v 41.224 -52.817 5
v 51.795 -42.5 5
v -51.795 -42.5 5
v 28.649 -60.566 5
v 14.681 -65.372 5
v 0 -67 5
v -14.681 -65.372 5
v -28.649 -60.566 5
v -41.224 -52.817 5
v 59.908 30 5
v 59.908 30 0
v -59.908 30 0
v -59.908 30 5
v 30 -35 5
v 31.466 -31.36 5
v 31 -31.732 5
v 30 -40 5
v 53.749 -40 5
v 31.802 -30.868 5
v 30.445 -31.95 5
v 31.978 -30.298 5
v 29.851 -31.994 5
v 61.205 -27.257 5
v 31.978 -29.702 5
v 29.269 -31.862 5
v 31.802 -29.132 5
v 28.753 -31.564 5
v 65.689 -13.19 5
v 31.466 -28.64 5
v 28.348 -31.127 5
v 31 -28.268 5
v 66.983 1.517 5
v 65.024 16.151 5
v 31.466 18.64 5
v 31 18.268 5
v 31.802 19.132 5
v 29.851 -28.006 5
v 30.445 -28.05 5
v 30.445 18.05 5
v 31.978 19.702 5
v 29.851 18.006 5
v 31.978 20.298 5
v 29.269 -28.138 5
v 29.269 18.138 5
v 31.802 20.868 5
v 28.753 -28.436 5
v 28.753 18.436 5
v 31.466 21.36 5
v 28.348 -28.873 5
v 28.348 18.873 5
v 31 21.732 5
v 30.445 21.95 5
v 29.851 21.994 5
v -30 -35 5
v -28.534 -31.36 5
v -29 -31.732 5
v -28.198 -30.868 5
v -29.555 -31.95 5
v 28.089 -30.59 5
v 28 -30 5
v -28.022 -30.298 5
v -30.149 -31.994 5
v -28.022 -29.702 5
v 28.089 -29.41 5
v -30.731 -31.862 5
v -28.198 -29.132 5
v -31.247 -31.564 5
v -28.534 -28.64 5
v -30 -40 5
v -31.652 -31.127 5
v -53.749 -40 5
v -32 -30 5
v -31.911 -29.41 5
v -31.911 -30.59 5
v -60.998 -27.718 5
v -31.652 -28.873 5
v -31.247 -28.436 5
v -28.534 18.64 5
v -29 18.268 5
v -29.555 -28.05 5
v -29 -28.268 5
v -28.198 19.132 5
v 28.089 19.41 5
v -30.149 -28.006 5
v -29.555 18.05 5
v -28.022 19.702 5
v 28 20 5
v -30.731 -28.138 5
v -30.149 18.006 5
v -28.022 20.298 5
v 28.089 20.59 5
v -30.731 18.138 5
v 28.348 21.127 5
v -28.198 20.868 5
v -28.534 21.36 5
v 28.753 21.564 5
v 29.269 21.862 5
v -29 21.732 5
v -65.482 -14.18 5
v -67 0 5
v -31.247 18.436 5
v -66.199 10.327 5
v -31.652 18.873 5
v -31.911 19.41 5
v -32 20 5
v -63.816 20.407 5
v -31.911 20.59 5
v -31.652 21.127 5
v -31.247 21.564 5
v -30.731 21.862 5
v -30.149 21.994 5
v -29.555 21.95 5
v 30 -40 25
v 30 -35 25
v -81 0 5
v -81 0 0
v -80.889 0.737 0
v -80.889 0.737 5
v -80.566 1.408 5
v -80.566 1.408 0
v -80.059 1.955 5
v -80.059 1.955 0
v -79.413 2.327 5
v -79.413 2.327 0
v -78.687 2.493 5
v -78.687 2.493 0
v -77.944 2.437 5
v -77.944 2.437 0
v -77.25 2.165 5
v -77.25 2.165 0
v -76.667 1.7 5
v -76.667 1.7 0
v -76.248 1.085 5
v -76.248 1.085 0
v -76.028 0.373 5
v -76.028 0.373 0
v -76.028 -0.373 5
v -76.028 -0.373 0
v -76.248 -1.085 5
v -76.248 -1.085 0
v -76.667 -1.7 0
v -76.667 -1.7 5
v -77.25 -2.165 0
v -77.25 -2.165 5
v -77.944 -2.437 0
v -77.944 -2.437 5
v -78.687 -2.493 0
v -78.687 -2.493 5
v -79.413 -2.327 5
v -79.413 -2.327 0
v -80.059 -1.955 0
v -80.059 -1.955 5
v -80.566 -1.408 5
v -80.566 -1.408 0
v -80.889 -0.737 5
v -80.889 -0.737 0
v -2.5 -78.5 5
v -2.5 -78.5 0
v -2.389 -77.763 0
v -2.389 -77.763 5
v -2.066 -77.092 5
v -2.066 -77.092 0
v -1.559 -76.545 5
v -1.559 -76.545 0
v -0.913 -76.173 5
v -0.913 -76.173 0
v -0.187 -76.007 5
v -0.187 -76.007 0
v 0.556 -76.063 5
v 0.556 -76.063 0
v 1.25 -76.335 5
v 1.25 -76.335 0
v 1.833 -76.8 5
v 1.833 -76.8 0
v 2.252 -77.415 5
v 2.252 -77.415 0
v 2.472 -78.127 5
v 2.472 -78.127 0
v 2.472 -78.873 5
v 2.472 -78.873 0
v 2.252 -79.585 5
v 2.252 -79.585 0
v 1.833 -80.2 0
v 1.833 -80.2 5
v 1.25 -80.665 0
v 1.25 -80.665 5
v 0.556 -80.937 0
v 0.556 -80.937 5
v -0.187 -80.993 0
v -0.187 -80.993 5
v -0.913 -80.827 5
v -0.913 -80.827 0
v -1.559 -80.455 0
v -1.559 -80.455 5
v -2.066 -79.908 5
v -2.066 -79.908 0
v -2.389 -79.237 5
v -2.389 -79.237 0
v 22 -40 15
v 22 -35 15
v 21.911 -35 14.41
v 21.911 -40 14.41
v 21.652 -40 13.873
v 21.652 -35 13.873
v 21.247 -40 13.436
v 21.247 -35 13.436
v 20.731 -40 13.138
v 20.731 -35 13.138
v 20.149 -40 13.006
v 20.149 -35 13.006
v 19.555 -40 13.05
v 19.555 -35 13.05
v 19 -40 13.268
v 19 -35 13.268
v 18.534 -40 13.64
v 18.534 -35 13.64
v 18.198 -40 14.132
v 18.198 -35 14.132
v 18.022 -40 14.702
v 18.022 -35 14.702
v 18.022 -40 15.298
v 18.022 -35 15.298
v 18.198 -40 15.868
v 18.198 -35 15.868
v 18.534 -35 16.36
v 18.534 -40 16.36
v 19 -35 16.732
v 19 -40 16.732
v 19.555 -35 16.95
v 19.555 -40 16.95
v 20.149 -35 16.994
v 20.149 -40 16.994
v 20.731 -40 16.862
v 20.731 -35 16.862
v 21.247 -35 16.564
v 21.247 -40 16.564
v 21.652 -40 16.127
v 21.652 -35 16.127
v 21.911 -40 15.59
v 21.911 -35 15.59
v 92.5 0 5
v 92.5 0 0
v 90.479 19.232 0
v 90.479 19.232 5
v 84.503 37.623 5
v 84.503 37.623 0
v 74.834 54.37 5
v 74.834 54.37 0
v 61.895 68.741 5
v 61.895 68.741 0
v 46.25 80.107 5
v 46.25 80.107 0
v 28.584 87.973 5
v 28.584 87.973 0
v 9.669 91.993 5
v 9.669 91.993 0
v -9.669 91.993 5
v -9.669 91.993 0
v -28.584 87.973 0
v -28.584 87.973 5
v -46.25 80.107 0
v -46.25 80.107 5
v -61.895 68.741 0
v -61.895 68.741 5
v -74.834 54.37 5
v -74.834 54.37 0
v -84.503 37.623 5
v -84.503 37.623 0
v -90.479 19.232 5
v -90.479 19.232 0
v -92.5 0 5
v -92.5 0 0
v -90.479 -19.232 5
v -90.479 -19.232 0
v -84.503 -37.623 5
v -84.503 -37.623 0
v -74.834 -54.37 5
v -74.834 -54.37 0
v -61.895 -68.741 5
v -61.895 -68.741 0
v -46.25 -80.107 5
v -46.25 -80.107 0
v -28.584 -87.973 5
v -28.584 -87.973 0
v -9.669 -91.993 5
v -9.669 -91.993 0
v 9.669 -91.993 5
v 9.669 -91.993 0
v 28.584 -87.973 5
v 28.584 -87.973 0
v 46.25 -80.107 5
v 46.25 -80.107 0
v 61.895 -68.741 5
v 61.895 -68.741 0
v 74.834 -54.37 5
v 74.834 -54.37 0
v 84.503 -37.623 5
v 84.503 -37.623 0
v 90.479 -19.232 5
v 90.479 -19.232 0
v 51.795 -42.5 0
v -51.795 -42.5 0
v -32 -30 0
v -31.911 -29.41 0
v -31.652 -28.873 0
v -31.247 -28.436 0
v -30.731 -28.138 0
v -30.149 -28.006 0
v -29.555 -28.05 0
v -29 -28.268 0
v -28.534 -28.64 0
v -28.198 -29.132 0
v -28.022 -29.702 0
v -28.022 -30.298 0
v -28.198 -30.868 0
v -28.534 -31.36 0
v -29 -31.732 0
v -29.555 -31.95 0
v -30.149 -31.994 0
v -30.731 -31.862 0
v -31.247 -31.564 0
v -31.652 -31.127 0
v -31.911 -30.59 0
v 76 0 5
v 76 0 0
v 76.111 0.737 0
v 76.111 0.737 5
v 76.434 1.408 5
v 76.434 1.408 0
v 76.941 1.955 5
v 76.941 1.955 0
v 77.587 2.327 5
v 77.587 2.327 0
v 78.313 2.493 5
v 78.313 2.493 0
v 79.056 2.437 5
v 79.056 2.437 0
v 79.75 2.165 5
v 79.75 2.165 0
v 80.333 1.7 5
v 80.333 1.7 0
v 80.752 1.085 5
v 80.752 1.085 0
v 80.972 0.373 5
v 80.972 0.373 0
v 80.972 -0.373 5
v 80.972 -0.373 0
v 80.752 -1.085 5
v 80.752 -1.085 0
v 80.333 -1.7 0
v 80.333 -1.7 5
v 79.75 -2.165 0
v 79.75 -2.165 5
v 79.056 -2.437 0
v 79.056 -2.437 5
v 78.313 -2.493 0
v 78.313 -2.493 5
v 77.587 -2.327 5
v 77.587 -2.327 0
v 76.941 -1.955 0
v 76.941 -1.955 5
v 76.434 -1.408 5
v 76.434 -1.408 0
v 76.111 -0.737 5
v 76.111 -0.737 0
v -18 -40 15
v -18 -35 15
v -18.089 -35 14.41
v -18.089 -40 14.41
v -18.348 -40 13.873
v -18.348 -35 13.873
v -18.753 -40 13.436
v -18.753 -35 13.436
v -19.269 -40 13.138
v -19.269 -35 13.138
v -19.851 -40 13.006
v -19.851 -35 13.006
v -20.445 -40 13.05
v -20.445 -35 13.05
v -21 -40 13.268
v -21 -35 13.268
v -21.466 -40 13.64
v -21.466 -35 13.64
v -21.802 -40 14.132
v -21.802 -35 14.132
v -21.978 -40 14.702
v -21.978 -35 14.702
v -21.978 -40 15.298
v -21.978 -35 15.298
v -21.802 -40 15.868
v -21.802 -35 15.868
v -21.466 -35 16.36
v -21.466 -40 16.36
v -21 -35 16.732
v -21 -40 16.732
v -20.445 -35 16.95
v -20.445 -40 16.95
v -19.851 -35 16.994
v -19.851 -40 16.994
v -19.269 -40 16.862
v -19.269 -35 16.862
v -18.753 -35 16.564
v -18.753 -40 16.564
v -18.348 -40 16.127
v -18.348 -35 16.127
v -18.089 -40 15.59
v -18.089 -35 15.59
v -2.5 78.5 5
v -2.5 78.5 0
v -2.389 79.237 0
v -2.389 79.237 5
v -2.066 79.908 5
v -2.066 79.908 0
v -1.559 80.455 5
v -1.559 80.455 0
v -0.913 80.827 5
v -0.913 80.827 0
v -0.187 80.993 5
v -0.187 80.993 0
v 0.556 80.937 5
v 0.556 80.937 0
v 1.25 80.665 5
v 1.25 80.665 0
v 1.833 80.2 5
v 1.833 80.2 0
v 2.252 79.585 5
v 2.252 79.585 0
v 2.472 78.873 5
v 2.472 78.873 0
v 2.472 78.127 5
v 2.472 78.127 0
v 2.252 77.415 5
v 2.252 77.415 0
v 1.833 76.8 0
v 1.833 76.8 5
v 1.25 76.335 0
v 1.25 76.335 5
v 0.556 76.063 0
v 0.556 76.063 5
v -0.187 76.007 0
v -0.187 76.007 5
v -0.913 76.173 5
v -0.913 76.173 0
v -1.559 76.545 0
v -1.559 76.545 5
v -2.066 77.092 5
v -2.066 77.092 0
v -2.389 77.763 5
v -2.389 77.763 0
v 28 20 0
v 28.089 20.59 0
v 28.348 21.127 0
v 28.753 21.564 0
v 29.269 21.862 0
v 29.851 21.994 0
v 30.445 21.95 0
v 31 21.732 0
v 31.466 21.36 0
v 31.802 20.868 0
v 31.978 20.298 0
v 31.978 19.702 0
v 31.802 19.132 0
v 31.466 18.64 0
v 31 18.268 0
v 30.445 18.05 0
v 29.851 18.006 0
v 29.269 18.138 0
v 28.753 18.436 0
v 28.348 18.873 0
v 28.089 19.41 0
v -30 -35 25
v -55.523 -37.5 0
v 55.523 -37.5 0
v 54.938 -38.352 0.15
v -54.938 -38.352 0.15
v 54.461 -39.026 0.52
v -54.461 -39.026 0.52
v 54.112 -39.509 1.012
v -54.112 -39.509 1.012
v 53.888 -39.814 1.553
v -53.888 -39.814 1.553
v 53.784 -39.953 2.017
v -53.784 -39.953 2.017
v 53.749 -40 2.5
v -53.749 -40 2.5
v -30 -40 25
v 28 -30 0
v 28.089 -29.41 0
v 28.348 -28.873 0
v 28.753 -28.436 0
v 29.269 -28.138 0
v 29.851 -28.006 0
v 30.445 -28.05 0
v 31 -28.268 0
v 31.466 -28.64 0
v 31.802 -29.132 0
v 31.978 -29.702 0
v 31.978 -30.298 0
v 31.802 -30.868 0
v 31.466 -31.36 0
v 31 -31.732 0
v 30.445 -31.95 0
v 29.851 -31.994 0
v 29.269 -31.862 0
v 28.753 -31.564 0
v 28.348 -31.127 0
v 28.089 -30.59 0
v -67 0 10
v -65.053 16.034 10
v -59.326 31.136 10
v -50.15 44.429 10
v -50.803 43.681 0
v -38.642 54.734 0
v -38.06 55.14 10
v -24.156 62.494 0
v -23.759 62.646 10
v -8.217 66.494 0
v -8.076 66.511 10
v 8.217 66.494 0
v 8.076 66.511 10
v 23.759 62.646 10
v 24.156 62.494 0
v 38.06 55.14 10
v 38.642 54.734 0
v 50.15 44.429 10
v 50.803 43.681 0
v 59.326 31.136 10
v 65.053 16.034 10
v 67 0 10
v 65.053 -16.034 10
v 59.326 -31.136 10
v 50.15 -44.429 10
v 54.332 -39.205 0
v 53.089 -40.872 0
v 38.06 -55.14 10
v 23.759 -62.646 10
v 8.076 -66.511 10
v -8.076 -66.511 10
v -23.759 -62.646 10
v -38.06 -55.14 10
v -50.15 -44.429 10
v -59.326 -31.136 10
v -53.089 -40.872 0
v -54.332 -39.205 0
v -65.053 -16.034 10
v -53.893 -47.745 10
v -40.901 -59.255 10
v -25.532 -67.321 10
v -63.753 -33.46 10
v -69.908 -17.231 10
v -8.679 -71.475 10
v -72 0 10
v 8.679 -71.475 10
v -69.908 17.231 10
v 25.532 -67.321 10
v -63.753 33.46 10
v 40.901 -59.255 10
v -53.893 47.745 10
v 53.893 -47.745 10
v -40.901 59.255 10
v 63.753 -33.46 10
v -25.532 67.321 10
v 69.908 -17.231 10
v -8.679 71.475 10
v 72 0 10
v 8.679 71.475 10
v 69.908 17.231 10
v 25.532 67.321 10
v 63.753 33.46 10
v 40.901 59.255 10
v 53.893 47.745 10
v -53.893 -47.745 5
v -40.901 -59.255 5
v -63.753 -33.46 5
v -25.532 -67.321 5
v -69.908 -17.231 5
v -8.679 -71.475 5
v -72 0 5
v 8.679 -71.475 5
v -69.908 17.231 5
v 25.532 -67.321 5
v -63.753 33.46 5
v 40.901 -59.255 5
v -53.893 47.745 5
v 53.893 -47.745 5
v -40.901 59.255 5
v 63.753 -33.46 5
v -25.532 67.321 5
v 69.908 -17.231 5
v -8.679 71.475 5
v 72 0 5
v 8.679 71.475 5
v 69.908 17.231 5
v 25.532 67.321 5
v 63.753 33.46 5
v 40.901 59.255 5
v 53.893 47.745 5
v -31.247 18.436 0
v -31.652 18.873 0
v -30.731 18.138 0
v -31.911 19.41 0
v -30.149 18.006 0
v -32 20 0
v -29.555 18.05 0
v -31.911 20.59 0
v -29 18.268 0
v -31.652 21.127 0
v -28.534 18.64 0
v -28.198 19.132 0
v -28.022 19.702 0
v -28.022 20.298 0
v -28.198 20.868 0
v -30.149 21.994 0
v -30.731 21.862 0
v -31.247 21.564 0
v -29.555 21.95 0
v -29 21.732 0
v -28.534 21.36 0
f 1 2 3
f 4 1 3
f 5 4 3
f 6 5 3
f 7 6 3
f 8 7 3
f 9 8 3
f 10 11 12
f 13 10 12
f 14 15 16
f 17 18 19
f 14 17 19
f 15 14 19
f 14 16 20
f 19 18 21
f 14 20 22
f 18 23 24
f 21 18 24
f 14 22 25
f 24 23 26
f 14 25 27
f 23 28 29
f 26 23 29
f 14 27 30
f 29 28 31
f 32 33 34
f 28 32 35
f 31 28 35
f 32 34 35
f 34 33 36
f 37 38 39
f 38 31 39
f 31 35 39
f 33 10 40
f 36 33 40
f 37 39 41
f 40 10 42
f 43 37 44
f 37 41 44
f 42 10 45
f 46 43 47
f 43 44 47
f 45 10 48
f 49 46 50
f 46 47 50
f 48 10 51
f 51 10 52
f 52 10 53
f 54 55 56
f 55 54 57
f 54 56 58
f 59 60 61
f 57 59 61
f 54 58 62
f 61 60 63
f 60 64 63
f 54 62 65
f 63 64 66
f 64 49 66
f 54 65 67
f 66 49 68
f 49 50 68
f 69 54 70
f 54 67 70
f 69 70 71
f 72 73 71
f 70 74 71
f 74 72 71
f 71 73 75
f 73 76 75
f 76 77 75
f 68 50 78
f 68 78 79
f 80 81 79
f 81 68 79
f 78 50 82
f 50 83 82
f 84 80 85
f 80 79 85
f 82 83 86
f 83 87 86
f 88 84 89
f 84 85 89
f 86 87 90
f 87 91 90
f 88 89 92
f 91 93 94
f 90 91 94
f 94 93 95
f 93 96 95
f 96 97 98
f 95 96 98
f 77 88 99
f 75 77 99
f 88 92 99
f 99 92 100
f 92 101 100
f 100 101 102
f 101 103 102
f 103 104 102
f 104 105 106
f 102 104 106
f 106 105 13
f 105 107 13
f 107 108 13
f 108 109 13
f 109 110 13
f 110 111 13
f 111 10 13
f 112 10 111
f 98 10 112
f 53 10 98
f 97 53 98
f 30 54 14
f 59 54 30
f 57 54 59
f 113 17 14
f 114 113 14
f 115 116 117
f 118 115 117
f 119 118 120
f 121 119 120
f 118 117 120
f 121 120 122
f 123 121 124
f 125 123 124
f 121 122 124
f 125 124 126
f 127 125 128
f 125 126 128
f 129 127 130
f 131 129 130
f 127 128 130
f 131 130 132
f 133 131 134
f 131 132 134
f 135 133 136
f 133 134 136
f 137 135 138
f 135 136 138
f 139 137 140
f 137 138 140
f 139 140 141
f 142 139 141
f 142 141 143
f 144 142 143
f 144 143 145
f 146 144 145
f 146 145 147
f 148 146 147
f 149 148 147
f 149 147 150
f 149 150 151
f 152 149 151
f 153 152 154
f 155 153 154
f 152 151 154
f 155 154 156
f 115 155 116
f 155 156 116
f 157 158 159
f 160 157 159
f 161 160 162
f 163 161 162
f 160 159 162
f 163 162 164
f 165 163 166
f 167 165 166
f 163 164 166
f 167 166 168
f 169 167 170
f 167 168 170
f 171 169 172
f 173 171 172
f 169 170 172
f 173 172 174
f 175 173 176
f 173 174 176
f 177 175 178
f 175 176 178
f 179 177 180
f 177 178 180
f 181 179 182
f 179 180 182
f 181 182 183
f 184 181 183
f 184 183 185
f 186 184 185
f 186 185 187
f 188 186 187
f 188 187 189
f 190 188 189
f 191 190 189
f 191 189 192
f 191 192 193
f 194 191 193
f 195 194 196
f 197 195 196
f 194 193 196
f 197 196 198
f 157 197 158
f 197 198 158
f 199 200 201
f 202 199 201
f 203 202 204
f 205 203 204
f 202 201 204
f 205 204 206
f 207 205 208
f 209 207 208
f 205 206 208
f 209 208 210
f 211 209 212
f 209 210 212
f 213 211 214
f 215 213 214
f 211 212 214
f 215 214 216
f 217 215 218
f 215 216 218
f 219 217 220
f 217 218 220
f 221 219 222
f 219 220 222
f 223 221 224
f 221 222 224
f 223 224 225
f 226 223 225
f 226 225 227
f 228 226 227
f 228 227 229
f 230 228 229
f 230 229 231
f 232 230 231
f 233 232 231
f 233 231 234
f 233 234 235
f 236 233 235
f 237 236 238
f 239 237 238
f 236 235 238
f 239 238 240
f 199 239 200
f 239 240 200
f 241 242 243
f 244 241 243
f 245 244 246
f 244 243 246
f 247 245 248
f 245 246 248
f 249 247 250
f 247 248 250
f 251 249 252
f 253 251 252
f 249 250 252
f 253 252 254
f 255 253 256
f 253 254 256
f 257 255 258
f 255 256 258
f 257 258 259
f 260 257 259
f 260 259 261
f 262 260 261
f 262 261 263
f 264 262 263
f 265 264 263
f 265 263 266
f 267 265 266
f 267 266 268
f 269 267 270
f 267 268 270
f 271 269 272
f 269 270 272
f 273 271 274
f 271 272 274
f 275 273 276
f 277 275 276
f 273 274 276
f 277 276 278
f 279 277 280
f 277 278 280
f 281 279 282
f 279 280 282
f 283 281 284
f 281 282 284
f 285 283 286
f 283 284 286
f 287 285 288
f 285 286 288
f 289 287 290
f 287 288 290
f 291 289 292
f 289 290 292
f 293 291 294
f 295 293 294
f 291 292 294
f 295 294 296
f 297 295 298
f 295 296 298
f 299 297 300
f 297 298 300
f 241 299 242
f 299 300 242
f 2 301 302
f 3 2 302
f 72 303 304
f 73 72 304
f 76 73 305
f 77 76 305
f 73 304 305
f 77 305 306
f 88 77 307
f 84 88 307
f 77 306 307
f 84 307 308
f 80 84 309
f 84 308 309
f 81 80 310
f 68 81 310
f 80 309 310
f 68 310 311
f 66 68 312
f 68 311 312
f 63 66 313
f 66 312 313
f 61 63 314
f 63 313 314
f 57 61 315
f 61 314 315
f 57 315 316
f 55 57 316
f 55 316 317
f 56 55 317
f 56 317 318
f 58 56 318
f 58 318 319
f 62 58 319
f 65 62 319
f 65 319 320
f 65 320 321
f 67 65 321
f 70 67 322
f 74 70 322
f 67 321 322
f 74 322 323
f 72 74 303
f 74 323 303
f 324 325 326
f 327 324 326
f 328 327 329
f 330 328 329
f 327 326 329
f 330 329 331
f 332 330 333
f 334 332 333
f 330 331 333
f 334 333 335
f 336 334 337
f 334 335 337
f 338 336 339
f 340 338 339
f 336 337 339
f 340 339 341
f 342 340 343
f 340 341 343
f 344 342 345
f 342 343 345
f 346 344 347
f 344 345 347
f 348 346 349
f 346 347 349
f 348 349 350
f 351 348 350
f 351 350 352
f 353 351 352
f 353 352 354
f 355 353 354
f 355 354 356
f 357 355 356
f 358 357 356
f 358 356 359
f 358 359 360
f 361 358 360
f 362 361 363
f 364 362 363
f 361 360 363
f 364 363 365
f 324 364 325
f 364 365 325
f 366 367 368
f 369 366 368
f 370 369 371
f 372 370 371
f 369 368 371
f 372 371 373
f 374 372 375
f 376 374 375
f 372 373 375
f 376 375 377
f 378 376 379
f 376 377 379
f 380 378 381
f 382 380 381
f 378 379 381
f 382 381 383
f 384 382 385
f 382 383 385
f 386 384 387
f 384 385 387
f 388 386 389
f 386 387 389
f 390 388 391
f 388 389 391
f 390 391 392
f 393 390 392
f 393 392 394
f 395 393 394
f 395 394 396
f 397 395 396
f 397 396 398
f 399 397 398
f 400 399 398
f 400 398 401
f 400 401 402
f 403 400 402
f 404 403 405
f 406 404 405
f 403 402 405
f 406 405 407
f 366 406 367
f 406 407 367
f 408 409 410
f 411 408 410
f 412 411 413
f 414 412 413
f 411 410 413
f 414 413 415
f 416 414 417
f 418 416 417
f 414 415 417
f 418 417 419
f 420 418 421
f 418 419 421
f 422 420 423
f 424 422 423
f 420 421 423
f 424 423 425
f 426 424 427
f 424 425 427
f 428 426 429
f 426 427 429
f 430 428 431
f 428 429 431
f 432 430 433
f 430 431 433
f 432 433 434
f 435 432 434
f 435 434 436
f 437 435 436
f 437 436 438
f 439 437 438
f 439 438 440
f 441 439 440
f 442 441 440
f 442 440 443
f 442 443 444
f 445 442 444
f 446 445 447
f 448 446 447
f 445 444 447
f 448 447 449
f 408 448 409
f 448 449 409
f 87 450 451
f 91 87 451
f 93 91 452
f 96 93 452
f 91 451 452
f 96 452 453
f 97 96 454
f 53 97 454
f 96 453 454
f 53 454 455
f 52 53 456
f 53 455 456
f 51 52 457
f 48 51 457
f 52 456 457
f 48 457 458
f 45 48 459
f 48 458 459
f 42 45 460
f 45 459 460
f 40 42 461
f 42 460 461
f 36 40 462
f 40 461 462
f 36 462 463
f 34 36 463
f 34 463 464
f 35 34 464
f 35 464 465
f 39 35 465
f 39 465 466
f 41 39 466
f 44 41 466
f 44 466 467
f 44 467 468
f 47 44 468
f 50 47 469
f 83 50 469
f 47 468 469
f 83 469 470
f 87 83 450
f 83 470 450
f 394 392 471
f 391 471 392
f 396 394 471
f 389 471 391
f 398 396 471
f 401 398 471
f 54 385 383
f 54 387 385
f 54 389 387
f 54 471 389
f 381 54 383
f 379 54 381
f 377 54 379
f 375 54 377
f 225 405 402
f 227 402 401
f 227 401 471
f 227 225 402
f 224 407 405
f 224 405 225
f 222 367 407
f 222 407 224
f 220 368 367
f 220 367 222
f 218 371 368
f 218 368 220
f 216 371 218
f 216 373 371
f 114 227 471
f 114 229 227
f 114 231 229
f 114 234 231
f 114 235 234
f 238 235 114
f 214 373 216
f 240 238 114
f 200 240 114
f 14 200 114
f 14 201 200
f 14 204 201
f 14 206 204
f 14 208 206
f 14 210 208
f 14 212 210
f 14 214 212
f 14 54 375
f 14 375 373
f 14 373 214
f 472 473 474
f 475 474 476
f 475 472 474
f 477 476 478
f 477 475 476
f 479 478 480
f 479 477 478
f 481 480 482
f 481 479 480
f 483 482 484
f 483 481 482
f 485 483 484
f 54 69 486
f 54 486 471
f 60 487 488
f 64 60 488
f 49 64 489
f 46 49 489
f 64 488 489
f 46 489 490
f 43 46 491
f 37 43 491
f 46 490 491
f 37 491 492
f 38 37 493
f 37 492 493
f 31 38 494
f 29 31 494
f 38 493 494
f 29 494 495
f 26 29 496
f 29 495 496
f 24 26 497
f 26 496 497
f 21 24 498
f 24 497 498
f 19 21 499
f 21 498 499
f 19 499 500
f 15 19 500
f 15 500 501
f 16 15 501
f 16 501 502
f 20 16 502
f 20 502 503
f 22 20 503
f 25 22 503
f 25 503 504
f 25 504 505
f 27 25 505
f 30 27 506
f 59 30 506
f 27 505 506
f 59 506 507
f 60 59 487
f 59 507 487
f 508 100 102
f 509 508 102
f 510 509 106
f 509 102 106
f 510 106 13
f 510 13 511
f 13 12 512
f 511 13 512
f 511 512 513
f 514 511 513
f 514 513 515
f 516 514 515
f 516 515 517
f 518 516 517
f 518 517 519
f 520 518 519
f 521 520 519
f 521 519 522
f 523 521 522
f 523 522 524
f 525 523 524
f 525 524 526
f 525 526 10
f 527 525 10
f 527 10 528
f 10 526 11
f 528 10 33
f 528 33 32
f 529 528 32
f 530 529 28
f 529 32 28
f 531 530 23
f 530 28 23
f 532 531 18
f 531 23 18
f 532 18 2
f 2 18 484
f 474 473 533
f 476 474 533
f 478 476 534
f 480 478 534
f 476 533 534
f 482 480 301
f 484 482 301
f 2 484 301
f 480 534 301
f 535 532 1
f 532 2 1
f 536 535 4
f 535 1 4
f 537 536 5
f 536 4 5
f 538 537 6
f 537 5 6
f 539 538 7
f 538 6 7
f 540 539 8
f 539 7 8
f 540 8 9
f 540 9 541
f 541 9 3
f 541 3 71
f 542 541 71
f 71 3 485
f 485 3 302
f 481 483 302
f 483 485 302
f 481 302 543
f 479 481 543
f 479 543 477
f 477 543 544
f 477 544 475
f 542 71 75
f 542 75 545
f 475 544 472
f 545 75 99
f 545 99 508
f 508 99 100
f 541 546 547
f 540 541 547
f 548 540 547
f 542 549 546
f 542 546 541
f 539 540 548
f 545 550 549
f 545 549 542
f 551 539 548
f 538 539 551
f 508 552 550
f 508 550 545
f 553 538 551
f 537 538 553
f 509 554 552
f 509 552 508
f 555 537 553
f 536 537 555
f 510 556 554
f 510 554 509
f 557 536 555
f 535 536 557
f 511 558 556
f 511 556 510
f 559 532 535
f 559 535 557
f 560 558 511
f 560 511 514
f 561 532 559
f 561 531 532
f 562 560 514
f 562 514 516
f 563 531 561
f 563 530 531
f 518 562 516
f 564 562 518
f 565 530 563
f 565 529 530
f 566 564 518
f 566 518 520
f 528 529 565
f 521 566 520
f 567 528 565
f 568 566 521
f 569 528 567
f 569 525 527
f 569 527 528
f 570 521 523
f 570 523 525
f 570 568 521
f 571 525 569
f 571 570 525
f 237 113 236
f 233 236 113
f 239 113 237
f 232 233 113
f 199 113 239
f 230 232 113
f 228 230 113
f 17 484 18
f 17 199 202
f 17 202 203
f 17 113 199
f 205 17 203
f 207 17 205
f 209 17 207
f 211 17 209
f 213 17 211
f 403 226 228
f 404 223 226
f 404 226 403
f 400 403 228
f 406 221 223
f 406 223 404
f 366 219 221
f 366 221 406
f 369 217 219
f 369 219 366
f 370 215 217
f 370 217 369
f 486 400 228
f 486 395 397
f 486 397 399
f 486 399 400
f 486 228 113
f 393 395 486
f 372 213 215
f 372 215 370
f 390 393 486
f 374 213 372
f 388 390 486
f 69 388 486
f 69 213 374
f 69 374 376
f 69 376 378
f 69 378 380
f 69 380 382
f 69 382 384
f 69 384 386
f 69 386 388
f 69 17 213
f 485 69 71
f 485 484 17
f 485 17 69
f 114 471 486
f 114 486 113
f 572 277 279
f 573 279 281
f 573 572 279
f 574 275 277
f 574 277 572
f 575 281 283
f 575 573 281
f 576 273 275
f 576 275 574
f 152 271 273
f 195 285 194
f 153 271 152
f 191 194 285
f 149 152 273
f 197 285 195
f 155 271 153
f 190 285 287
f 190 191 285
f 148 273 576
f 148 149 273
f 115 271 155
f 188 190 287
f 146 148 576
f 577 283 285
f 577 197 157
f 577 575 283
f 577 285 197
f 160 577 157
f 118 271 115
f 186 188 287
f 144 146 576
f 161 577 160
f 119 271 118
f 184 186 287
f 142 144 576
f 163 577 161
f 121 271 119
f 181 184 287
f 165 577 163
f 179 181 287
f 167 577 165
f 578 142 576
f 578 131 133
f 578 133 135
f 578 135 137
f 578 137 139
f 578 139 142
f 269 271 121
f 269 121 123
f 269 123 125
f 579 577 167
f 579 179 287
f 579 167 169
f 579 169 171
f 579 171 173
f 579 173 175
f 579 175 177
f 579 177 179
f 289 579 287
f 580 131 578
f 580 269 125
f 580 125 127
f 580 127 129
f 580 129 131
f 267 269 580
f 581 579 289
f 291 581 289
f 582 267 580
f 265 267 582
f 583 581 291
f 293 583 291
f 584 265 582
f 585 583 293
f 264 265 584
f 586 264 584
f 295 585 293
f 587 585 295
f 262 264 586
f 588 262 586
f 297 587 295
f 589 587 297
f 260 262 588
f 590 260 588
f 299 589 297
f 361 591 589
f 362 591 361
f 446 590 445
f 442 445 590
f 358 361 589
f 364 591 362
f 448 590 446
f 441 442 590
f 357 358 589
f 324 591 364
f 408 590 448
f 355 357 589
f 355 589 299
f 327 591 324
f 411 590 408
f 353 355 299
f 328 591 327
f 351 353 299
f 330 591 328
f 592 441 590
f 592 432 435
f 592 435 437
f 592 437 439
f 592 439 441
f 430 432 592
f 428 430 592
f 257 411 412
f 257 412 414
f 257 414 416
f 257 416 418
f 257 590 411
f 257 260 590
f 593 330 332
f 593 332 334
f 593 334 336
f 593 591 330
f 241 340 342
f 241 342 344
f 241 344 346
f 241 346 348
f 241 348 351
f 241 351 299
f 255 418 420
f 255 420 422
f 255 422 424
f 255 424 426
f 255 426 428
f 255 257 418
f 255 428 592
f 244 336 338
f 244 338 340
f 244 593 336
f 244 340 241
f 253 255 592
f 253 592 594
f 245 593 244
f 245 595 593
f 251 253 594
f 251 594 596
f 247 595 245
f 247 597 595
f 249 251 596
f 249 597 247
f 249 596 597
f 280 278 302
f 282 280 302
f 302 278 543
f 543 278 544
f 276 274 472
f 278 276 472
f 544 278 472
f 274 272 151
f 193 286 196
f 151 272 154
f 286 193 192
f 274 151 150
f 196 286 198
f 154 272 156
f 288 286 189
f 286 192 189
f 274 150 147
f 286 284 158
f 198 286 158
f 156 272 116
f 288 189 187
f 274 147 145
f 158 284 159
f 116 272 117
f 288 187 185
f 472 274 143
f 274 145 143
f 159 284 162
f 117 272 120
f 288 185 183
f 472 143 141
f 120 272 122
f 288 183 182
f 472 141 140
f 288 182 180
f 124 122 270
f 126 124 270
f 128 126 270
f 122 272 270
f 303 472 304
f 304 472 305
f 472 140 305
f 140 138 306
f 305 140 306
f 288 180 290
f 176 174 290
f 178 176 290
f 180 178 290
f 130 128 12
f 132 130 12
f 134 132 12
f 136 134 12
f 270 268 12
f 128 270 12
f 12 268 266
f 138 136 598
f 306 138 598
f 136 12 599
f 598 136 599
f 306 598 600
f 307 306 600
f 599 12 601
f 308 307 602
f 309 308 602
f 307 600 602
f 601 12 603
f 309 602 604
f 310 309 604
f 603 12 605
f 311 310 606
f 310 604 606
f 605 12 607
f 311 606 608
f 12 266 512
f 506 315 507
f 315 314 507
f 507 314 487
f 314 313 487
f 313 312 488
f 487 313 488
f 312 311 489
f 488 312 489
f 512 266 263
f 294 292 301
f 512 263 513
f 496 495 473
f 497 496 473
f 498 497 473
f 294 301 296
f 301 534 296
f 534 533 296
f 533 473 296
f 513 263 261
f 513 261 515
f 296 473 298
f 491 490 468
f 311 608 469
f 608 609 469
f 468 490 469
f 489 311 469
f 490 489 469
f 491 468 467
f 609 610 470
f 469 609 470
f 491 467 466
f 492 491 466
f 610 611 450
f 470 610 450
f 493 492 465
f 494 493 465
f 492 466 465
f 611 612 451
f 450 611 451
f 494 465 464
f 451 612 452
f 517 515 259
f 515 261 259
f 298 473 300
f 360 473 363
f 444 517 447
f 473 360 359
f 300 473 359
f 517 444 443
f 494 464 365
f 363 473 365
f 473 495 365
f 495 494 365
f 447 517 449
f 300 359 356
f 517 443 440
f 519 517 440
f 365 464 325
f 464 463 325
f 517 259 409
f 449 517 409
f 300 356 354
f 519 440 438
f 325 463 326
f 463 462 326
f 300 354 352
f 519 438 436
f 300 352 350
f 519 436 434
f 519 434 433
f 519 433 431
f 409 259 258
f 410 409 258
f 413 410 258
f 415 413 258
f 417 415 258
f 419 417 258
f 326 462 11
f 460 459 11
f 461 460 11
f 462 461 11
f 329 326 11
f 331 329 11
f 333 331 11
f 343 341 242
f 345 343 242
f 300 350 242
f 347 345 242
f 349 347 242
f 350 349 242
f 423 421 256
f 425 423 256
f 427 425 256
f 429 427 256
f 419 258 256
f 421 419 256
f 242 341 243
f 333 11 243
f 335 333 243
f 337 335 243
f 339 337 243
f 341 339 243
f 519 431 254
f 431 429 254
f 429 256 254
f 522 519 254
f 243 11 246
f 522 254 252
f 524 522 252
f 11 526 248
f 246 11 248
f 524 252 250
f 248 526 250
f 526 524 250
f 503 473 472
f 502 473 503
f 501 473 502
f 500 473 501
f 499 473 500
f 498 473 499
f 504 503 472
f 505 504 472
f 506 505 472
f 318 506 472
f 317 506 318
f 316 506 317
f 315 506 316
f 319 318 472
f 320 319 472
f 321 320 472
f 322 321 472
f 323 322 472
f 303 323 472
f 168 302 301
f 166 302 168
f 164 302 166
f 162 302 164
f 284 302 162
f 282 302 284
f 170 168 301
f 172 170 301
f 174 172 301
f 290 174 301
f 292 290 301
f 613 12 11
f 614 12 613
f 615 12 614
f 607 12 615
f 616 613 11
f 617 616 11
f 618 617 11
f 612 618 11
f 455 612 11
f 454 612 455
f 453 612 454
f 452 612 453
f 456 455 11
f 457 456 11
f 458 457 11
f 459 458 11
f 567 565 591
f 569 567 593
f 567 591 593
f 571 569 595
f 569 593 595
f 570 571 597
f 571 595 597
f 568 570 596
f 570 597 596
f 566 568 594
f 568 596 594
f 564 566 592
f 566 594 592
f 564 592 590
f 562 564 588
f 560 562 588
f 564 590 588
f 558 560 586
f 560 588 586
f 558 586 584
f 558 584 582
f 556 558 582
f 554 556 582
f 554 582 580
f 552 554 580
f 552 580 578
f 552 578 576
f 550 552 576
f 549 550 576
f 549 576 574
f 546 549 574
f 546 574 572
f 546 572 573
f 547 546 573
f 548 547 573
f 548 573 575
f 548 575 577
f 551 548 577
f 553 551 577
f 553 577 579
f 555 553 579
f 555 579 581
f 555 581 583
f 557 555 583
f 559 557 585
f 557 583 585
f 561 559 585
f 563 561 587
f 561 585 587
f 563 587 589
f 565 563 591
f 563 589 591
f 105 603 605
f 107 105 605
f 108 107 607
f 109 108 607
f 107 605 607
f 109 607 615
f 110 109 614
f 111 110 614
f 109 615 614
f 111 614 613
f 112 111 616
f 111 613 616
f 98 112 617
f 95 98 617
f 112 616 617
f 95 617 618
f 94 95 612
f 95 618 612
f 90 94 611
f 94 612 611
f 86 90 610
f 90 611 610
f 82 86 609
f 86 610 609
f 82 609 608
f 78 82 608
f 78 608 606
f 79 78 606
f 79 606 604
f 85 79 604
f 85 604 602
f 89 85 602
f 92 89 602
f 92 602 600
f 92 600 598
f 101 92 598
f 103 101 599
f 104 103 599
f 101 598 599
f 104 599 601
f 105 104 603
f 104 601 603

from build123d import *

# Parameters (mm, degrees)
SKETCH1_R           = 92.5
BOSS_EXTRUDE1_DEPTH = 5
SKETCH2_R           = 72
BOSS_EXTRUDE2_DEPTH = 5
SKETCH3_R           = 67
CUT_EXTRUDE1_DEPTH  = 11
SKETCH4_W           = 140
SKETCH4_H           = 70
BOSS_EXTRUDE3_DEPTH = 5
SKETCH6_W           = 60
SKETCH6_H           = 5
BOSS_EXTRUDE4_DEPTH = 20
FILLET1_R           = 2.5
SKETCH7_W           = 110
SKETCH7_H           = 25
BOSS_EXTRUDE5_DEPTH = 5
SKETCH11_R          = 2
CUT_EXTRUDE4_DEPTH  = 5
SKETCH12_R          = 2.5
CUT_EXTRUDE5_DEPTH  = 5
SKETCH13_R          = 2
CUT_EXTRUDE6_DEPTH  = 5


with BuildPart() as part:
    # Sketch1 → Boss-Extrude1 (new body)
    with BuildSketch(Plane.XY):
        Circle(SKETCH1_R)
    extrude(amount=BOSS_EXTRUDE1_DEPTH)

    # Sketch2 → Boss-Extrude2 (add)
    with BuildSketch(Plane.XY.offset(5)):
        Circle(SKETCH2_R)
    extrude(amount=BOSS_EXTRUDE2_DEPTH)

    # Sketch3 → Cut-Extrude1 (cut, through all)
    with BuildSketch(Plane(origin=(0, 0, 0), x_dir=(-1, 0, 0), z_dir=(0, 0, -1))):
        Circle(SKETCH3_R)
    extrude(amount=-CUT_EXTRUDE1_DEPTH, mode=Mode.SUBTRACT)

    # Sketch4 → Boss-Extrude3 (add)
    with BuildSketch(Plane(origin=(0, 0, 0), x_dir=(-1, 0, 0), z_dir=(0, 0, -1))):
        with Locations((0, -5)):
            Rectangle(SKETCH4_W, SKETCH4_H)
    extrude(amount=-BOSS_EXTRUDE3_DEPTH)

    # Sketch6 → Boss-Extrude4 (add)
    with BuildSketch(Plane.XY.offset(5)):
        with Locations((0, -37.5)):
            Rectangle(SKETCH6_W, SKETCH6_H)
    extrude(amount=BOSS_EXTRUDE4_DEPTH)

    # Fillet1
    fillet1_edges = [part.edges().sort_by_distance(p)[0] for p in [
        (0, -40, 0),
    ]]
    fillet(fillet1_edges, radius=FILLET1_R)

    # Sketch7 → Boss-Extrude5 (add)
    with BuildSketch(Plane(origin=(0, 0, 0), x_dir=(-1, 0, 0), z_dir=(0, 0, -1))):
        with Locations((0, -55)):
            Rectangle(SKETCH7_W, SKETCH7_H)
    extrude(amount=-BOSS_EXTRUDE5_DEPTH)

    # Sketch11 → Cut-Extrude4 (cut)
    with BuildSketch(Plane(origin=(0, 0, 0), x_dir=(-1, 0, 0), z_dir=(0, 0, -1))):
        with Locations((-30, -30)):
            Circle(SKETCH11_R)
        with Locations((-30, 20)):
            Circle(SKETCH11_R)
        with Locations((30, 20)):
            Circle(SKETCH11_R)
        with Locations((30, -30)):
            Circle(SKETCH11_R)
    extrude(amount=-CUT_EXTRUDE4_DEPTH, mode=Mode.SUBTRACT)

    # Sketch12 → Cut-Extrude5 (cut)
    with BuildSketch(Plane(origin=(0, 0, 0), x_dir=(-1, 0, 0), z_dir=(0, 0, -1))):
        with Locations((0, -78.5)):
            Circle(SKETCH12_R)
        with Locations((-78.5, 0)):
            Circle(SKETCH12_R)
        with Locations((0, 78.5)):
            Circle(SKETCH12_R)
        with Locations((78.5, 0)):
            Circle(SKETCH12_R)
    extrude(amount=-CUT_EXTRUDE5_DEPTH, mode=Mode.SUBTRACT)

    # Sketch13 → Cut-Extrude6 (cut)
    with BuildSketch(Plane(origin=(0, -35, 0), x_dir=(1, 0, 0), z_dir=(0, 1, 0))):
        with Locations((-20, -15)):
            Circle(SKETCH13_R)
        with Locations((20, -15)):
            Circle(SKETCH13_R)
    extrude(amount=-CUT_EXTRUDE6_DEPTH, mode=Mode.SUBTRACT)


solid = part.part
